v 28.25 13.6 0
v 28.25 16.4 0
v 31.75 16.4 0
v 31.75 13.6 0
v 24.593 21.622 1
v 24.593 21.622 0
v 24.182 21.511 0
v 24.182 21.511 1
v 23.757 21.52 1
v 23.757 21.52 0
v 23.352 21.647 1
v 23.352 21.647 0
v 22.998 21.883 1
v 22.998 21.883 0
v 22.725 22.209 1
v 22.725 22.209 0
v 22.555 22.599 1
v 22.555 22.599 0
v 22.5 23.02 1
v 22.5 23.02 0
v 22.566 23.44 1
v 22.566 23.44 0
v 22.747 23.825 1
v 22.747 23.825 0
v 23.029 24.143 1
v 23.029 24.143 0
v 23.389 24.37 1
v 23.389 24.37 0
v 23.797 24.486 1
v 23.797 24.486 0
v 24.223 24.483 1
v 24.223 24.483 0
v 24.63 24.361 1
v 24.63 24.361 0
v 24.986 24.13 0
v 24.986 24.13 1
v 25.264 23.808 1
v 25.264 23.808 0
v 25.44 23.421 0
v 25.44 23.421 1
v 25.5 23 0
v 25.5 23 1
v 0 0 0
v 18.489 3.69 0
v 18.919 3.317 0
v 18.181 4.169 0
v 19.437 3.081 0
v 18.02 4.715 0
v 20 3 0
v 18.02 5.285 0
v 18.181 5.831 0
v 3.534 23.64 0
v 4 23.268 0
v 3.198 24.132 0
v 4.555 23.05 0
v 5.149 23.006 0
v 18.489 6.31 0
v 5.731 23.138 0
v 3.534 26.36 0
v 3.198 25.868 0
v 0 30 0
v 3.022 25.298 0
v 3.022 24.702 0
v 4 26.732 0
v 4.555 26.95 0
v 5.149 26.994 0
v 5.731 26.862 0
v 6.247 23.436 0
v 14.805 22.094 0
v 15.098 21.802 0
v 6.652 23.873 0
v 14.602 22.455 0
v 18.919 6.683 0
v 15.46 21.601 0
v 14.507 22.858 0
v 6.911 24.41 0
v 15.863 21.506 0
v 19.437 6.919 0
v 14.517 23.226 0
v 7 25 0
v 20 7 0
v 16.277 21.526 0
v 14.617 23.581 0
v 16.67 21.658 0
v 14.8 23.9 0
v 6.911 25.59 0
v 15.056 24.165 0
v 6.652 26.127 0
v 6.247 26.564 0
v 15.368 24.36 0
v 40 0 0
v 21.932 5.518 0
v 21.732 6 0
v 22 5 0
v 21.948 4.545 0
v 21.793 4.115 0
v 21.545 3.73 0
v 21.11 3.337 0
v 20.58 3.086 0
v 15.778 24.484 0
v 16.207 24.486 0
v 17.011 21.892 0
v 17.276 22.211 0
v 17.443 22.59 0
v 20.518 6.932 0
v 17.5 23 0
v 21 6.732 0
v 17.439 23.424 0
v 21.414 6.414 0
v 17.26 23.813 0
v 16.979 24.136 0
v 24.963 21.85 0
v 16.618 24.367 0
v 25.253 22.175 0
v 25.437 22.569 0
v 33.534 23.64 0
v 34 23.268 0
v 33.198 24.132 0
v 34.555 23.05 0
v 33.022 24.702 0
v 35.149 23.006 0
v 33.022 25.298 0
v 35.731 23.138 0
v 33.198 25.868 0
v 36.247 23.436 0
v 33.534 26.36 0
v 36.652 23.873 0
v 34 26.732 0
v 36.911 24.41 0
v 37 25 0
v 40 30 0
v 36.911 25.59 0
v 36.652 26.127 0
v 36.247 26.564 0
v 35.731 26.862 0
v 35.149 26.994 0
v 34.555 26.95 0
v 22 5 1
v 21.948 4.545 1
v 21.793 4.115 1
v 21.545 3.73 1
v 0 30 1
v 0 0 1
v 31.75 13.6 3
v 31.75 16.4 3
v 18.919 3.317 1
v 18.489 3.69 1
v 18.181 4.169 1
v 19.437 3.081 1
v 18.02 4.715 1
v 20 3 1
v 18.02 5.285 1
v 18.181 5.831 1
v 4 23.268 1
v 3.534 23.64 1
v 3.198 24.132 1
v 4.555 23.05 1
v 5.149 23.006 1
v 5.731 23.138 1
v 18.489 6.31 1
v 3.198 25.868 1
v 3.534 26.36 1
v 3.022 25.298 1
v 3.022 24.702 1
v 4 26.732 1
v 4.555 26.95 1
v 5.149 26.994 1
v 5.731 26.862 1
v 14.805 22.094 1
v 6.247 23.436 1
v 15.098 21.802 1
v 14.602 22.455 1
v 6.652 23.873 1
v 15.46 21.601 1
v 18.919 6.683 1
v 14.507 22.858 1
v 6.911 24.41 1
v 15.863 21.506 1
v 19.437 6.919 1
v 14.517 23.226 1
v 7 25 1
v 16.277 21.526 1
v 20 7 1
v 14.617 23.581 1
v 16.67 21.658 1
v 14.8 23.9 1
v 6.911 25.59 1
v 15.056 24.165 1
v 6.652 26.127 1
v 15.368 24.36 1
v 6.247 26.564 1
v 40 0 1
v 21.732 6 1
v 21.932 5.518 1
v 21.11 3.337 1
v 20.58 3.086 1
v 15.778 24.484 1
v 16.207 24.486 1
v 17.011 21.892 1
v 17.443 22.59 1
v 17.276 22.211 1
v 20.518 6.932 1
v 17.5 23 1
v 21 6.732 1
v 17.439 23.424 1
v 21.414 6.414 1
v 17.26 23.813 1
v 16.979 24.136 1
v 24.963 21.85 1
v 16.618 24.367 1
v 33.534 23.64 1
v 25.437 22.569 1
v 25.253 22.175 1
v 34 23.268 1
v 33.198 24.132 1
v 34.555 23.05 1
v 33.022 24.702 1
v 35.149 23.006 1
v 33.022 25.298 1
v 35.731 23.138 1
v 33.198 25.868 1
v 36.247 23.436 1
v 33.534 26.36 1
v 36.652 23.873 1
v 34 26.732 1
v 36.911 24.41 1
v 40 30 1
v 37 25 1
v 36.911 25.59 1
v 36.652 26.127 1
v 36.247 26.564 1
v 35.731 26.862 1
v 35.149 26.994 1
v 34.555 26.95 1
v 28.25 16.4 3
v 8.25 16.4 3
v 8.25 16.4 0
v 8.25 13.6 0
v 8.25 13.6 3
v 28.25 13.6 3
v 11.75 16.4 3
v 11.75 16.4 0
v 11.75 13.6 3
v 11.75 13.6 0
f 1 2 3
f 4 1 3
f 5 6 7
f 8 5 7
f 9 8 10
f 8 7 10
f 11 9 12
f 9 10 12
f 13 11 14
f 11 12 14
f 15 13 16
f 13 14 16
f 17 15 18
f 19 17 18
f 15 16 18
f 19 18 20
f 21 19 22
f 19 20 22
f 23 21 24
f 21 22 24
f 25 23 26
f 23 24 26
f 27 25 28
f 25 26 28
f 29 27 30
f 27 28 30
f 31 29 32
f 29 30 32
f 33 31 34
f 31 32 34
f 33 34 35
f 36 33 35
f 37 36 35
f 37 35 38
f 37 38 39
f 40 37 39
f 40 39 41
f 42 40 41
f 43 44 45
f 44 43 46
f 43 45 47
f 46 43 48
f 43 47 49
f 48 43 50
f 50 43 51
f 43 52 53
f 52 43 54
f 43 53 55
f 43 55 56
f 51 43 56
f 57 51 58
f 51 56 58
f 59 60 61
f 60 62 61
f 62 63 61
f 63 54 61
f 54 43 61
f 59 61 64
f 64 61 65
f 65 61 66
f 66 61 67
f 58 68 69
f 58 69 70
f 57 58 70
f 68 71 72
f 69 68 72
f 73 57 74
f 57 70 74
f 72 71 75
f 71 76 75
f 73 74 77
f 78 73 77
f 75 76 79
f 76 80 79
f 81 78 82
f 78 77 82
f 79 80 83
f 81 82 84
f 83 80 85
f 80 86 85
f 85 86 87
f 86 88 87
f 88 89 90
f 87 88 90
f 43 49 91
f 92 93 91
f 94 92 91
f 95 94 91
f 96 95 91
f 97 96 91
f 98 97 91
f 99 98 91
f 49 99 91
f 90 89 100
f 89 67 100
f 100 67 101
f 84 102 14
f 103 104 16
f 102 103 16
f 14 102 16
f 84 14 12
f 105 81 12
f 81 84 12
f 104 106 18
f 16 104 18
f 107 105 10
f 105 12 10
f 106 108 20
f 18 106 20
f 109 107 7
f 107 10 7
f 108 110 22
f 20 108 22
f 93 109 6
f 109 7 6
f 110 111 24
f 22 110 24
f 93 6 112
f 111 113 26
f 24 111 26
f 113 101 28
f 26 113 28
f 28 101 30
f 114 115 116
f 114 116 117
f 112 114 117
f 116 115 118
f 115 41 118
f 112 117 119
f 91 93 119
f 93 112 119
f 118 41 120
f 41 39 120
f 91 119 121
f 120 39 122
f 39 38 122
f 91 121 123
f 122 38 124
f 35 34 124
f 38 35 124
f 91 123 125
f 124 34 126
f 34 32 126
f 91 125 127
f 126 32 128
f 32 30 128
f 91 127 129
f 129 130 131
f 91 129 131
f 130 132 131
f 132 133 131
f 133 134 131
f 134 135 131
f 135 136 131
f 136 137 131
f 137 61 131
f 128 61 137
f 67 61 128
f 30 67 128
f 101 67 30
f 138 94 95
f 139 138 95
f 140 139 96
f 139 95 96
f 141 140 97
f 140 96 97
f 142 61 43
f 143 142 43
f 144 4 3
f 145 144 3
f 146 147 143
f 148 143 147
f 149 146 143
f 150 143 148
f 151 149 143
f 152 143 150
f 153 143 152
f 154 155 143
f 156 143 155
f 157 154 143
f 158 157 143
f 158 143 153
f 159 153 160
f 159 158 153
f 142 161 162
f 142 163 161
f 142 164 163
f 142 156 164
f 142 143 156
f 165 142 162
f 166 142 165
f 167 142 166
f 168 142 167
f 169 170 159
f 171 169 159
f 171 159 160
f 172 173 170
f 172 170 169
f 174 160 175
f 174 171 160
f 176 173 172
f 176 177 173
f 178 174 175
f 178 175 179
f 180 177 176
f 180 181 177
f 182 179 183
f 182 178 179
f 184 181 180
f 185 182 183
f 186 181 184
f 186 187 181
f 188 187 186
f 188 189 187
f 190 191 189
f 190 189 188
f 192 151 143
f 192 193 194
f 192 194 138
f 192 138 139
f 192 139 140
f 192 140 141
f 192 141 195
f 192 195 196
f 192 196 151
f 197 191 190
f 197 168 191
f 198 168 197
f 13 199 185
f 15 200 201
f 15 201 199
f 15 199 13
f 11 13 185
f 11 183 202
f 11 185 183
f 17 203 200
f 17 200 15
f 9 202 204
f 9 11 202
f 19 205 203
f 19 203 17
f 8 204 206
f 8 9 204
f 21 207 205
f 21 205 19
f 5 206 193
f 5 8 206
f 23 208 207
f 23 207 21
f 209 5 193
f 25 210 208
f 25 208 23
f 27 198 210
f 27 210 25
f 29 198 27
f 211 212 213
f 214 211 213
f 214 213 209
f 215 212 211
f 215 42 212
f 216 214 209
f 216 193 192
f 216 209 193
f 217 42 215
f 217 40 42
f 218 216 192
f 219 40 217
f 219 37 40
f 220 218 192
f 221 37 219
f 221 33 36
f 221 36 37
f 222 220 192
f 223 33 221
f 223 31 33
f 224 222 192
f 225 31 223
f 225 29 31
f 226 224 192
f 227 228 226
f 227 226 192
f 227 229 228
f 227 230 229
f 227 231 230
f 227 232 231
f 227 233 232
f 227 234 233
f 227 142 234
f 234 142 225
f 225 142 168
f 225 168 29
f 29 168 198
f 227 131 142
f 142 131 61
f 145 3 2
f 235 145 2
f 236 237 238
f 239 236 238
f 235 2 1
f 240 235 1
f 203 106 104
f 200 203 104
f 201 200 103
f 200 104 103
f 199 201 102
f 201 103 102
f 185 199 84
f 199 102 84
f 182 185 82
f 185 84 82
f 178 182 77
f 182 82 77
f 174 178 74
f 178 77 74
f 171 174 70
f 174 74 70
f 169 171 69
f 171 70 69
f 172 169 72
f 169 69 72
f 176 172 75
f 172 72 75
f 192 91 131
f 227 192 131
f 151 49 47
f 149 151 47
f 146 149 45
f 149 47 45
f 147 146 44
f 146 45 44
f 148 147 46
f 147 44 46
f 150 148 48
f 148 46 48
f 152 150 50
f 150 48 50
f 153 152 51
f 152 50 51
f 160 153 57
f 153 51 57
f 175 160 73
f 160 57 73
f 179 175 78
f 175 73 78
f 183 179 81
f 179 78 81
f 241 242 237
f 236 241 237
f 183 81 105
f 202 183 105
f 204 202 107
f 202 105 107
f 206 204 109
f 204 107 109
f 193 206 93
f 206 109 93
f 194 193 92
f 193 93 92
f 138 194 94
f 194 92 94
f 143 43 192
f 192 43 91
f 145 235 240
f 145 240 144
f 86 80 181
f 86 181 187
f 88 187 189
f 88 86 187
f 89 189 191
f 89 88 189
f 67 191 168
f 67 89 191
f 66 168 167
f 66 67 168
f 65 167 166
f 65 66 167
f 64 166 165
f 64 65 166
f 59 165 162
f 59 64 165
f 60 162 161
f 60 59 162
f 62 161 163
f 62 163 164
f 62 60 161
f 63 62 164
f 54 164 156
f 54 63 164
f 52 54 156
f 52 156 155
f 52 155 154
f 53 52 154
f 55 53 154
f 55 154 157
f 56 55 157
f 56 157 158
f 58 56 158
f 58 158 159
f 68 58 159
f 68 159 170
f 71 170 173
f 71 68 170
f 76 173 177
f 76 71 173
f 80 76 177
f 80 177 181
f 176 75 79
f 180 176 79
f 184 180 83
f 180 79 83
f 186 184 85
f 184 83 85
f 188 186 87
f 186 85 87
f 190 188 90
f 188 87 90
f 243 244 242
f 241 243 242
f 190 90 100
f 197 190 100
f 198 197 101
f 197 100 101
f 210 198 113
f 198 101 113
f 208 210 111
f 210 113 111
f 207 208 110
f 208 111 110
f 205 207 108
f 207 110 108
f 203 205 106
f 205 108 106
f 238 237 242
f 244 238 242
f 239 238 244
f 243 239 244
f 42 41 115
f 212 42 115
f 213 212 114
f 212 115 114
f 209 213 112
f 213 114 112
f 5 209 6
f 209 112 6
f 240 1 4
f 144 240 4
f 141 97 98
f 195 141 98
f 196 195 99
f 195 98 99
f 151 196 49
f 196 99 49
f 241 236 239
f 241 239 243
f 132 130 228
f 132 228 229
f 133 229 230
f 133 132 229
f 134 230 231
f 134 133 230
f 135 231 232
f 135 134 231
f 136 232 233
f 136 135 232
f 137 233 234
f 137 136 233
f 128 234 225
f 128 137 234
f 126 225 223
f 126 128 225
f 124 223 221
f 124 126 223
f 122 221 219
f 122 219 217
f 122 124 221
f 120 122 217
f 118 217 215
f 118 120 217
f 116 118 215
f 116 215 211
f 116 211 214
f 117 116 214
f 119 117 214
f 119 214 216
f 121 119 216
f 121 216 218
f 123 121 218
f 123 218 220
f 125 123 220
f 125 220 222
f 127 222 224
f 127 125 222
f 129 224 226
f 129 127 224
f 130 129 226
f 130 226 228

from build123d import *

# Parameters (mm, degrees)
F0_R     = 2
F1_DEPTH = 1
F2_DEPTH = 3


with BuildPart() as f1:
    # F0 (on Top) → F1 (new body)
    with BuildSketch(Plane.XY):
        with BuildLine():
            Line((0, 30), (0, 0))
            Line((0, 0), (20, 0))
            Line((20, 0), (20, 0.5))
            ThreePointArc((20, 0.5), (15.5, 5), (20, 9.5))
            Line((20, 9.5), (5, 9.5))
            Line((5, 9.5), (5, 20.5))
            Line((5, 20.5), (13.1542079159, 20.5))
            Line((13.1542079159, 20.5), (14.5067032721, 22.8583494358))
            ThreePointArc((14.5067032721, 22.8583494358), (14.6987936477, 23.7462318867), (15.3681283209, 24.3604183846))
            Line((15.3681283209, 24.3604183846), (18.6023852252, 30))
            Line((18.6023852252, 30), (0, 30))
        make_face()
        with BuildLine():
            ThreePointArc((9.5, 25), (8.1819805153, 21.8180194847), (5, 20.5))
            ThreePointArc((5, 20.5), (1.8180194847, 28.1819805153), (9.5, 25))
        make_face(mode=Mode.SUBTRACT)
        Polygon((5, 9.5), (20, 9.5), (20, 20.5), (13.1542079159, 20.5), (5, 20.5), align=None)
        Polygon((8.25, 16.4), (10.8028892877, 16.4), (11.75, 16.4), (11.75, 13.6), (8.25, 13.6), align=None, mode=Mode.SUBTRACT)
        Polygon((27.5459935813, 9.5), (29.8604090717, 0), (40, 0), (40, 9.5), (35, 9.5), align=None)
        Polygon((24.866144066, 20.5), (27.5459935813, 9.5), (35, 9.5), (35, 20.5), (28.6657820621, 20.5), align=None)
        Polygon((28.25, 16.4), (29.6603808885, 16.4), (31.75, 16.4), (31.75, 13.6), (28.25, 13.6), align=None, mode=Mode.SUBTRACT)
        Polygon((26.3612238059, 30), (20, 30), (20, 20.5), (24.866144066, 20.5), (28.6657820621, 20.5), align=None)
        with BuildLine():
            ThreePointArc((25.5, 23), (25.2528295373, 22.1751253729), (24.5927757995, 21.6220969368))
            ThreePointArc((24.5927757995, 21.6220969368), (22.7471704627, 23.8248746271), (25.5, 23))
        make_face(mode=Mode.SUBTRACT)
        Polygon((20, 20.5), (20, 9.5), (27.5459935813, 9.5), (24.866144066, 20.5), align=None)
        with BuildLine():
            ThreePointArc((9.5, 25), (1.8180194847, 28.1819805153), (5, 20.5))
            ThreePointArc((5, 20.5), (8.1819805153, 21.8180194847), (9.5, 25))
        make_face()
        with Locations((5, 25)):
            Circle(F0_R, mode=Mode.SUBTRACT)
        with BuildLine():
            ThreePointArc((39.5, 25), (31.8180194847, 28.1819805153), (35, 20.5))
            ThreePointArc((35, 20.5), (37.8235020538, 21.4960256633), (39.3971016605, 24.0431839323))
            ThreePointArc((39.3971016605, 24.0431839323), (39.4742014635, 24.5188334343), (39.5, 25))
        make_face()
        with Locations((35, 25)):
            Circle(F0_R, mode=Mode.SUBTRACT)
        with BuildLine():
            Line((35, 9.5), (40, 9.5))
            Line((40, 9.5), (40, 23.9542004244))
            Line((40, 23.9542004244), (39.3971016605, 24.0431839323))
            ThreePointArc((39.3971016605, 24.0431839323), (37.8235020538, 21.4960256633), (35, 20.5))
            Line((35, 20.5), (35, 9.5))
        make_face()
        with BuildLine():
            Line((40, 30), (26.3612238059, 30))
            Line((26.3612238059, 30), (28.6657820621, 20.5))
            Line((28.6657820621, 20.5), (35, 20.5))
            ThreePointArc((35, 20.5), (31.8180194847, 28.1819805153), (39.5, 25))
            ThreePointArc((39.5, 25), (39.4742014635, 24.5188334343), (39.3971016605, 24.0431839323))
            Line((39.3971016605, 24.0431839323), (40, 23.9542004244))
            Line((40, 23.9542004244), (40, 30))
        make_face()
        with BuildLine():
            Line((23.4659308964, 2.1299263039), (26.0225208067, 0))
            Line((26.0225208067, 0), (29.8604090717, 0))
            Line((29.8604090717, 0), (27.5459935813, 9.5))
            Line((27.5459935813, 9.5), (20, 9.5))
            ThreePointArc((20, 9.5), (23.1819805153, 8.1819805153), (24.5, 5))
            ThreePointArc((24.5, 5), (24.2335971132, 3.4746621741), (23.4659308964, 2.1299263039))
        make_face()
        with BuildLine():
            Line((20, 30), (18.6023852252, 30))
            Line((18.6023852252, 30), (15.3681283209, 24.3604183846))
            ThreePointArc((15.3681283209, 24.3604183846), (16.806905348, 24.2644776627), (17.5, 23))
            ThreePointArc((17.5, 23), (16.0709045418, 21.5016767552), (14.5067032721, 22.8583494358))
            Line((14.5067032721, 22.8583494358), (13.1542079159, 20.5))
            Line((13.1542079159, 20.5), (20, 20.5))
            Line((20, 20.5), (20, 30))
        make_face()
        with BuildLine():
            ThreePointArc((20, 9.5), (15.5, 5), (20, 0.5))
            Line((20, 0.5), (20, 3))
            ThreePointArc((20, 3), (18, 5), (20, 7))
            Line((20, 7), (20, 9.5))
        make_face()
        with BuildLine():
            Line((21.5451496956, 3.7301526004), (23.4659308964, 2.1299263039))
            ThreePointArc((23.4659308964, 2.1299263039), (24.2335971132, 3.4746621741), (24.5, 5))
            ThreePointArc((24.5, 5), (23.1819805153, 8.1819805153), (20, 9.5))
            Line((20, 9.5), (20, 7))
            ThreePointArc((20, 7), (21.4142135624, 6.4142135624), (22, 5))
            ThreePointArc((22, 5), (21.882856791, 4.3255740927), (21.5451496956, 3.7301526004))
        make_face()
        Polygon((11.75, 16.4), (10.8028892877, 16.4), (8.25, 16.4), (8.25, 13.6), (11.75, 13.6), align=None)
        Polygon((31.75, 16.4), (29.6603808885, 16.4), (28.25, 16.4), (28.25, 13.6), (31.75, 13.6), align=None)
        with BuildLine():
            Line((20, 3), (20, 0.5))
            ThreePointArc((20, 0.5), (21.9150285073, 0.9278180522), (23.4659308964, 2.1299263039))
            Line((23.4659308964, 2.1299263039), (21.5451496956, 3.7301526004))
            ThreePointArc((21.5451496956, 3.7301526004), (20.8544896725, 3.1917280626), (20, 3))
        make_face()
        with BuildLine():
            Line((20, 0.5), (20, 0))
            Line((20, 0), (26.0225208067, 0))
            Line((26.0225208067, 0), (23.4659308964, 2.1299263039))
            ThreePointArc((23.4659308964, 2.1299263039), (21.9150285073, 0.9278180522), (20, 0.5))
        make_face()
    extrude(amount=F1_DEPTH)


with BuildPart() as f2:
    # F0 (on Top) → F2 (new body)
    with BuildSketch(Plane.XY):
        Polygon((31.75, 16.4), (29.6603808885, 16.4), (28.25, 16.4), (28.25, 13.6), (31.75, 13.6), align=None)
    extrude(amount=F2_DEPTH)


with BuildPart() as f2b:
    # F0 (on Top) → F2, piece 2 (new body)
    with BuildSketch(Plane.XY):
        Polygon((11.75, 16.4), (10.8028892877, 16.4), (8.25, 16.4), (8.25, 13.6), (11.75, 13.6), align=None)
    extrude(amount=F2_DEPTH)


solid = Compound([f1.part, f2.part, f2b.part])
